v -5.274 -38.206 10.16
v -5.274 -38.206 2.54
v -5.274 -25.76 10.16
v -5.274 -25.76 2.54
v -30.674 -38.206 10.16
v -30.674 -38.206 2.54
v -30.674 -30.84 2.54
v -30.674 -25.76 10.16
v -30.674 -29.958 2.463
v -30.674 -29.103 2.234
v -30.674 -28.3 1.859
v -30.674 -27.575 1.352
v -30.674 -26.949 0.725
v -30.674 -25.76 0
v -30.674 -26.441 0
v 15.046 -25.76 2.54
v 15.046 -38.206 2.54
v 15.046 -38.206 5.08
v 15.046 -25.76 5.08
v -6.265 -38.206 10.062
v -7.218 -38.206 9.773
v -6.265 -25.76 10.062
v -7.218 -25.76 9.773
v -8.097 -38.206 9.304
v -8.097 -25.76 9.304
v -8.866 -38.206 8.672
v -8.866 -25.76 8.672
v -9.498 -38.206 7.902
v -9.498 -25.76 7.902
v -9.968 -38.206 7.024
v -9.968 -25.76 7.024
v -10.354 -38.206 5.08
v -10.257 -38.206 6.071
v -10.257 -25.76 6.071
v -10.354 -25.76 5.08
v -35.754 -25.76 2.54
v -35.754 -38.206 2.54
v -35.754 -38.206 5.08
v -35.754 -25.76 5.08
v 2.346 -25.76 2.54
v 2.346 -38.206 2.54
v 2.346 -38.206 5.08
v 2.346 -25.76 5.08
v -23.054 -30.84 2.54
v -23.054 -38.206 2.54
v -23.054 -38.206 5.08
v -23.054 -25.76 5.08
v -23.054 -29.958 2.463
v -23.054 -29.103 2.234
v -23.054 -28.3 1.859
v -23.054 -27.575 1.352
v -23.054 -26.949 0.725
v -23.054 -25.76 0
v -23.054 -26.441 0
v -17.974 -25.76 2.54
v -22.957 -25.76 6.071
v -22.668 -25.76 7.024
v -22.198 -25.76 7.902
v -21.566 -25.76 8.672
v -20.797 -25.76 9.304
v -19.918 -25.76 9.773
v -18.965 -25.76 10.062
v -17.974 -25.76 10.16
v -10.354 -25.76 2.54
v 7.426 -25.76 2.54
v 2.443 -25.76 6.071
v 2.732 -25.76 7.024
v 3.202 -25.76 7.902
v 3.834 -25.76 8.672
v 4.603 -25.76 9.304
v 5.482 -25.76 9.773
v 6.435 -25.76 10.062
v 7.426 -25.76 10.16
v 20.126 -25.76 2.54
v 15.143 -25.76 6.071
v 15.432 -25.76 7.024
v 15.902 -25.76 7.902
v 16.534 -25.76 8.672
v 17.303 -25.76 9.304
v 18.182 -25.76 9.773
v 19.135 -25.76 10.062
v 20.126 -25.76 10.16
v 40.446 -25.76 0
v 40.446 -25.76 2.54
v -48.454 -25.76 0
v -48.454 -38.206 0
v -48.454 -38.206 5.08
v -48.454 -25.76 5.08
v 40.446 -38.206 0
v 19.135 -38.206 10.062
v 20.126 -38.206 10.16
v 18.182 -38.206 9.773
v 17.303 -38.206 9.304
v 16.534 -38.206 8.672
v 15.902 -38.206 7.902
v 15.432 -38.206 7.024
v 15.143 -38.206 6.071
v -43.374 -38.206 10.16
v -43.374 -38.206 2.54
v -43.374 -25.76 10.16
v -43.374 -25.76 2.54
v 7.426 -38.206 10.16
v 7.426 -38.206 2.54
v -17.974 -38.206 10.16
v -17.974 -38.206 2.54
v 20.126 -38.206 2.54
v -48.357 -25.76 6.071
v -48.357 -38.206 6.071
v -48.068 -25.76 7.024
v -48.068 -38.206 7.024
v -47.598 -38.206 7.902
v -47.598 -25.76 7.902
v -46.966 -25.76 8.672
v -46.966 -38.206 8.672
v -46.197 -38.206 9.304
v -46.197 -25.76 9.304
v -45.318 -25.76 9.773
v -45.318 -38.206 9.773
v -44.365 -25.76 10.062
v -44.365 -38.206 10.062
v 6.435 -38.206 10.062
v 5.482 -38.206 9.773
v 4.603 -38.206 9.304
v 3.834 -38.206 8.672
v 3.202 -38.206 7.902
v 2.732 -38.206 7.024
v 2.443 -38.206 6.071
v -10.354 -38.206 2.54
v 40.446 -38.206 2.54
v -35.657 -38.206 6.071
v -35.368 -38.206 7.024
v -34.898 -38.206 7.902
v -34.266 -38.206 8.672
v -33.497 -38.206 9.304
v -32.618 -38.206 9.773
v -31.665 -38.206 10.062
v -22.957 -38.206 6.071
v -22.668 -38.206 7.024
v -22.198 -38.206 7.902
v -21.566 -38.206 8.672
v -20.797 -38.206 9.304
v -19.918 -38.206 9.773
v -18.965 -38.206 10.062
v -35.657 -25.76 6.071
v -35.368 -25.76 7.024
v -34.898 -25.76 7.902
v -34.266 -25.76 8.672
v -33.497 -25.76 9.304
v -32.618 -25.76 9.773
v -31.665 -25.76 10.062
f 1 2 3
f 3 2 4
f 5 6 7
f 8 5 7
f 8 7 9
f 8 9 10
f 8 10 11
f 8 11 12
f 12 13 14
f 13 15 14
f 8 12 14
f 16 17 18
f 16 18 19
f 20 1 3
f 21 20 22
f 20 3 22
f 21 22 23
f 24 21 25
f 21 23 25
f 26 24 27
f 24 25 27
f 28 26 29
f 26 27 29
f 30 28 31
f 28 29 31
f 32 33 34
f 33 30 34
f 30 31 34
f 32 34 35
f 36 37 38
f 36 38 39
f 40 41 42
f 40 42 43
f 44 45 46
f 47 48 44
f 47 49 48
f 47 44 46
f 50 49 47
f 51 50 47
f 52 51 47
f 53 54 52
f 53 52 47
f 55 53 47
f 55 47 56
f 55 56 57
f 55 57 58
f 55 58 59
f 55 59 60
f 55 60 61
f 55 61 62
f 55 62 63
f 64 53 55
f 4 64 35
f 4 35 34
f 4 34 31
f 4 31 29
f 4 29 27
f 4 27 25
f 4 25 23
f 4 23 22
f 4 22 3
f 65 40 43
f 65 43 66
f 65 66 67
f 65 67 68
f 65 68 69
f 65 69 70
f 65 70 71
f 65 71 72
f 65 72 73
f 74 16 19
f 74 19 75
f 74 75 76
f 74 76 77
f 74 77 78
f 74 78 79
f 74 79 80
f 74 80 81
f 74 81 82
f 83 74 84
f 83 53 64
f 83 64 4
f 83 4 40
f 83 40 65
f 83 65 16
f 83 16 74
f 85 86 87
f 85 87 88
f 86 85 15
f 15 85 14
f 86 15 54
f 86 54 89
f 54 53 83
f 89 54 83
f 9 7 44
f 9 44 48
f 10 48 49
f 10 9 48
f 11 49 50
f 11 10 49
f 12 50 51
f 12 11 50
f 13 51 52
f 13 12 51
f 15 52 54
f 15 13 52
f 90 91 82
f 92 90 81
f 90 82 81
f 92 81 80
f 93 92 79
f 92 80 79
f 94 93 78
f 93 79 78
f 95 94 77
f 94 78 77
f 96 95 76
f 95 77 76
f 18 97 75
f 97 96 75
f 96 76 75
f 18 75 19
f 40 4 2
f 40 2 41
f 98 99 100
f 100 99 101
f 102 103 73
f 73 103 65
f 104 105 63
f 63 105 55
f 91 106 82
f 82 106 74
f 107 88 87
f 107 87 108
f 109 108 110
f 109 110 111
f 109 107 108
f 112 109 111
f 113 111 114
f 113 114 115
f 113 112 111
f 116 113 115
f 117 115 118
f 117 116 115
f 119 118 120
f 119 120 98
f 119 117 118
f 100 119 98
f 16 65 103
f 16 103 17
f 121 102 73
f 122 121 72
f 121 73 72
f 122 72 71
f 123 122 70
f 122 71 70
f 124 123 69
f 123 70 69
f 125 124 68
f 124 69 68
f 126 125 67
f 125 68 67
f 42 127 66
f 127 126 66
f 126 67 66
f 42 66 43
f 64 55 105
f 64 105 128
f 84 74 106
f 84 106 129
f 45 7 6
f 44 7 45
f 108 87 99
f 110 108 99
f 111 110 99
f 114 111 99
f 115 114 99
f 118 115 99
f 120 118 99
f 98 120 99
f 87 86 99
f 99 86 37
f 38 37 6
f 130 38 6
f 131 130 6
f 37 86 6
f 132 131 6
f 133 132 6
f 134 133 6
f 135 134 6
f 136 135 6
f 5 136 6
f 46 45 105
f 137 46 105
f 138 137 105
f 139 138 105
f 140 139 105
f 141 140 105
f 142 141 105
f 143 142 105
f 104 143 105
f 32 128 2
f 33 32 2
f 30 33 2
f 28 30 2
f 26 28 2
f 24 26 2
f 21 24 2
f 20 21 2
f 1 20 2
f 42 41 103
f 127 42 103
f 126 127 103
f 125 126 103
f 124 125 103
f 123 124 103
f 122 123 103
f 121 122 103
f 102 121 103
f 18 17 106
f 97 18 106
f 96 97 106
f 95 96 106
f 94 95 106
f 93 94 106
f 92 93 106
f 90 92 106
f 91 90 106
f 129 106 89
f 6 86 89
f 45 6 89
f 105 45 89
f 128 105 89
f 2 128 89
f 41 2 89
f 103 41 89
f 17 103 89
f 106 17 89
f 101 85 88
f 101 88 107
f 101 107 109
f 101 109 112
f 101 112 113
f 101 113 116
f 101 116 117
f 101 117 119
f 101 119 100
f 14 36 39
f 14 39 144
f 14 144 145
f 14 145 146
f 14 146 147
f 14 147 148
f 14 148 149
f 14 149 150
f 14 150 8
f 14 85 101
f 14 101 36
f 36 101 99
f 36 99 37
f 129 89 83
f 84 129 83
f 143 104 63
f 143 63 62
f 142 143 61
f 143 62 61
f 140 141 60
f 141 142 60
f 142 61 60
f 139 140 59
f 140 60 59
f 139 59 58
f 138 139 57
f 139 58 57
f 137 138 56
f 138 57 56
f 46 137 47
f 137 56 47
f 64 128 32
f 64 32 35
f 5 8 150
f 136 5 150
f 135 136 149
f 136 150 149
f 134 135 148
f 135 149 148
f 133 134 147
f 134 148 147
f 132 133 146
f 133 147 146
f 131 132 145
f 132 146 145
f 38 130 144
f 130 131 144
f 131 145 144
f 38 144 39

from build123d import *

# Parameters (mm, degrees)
F0_W        = 88.9
F0_H        = 12.446
F1_DEPTH    = 2.54
F2_W        = 5.08
F2_H        = 12.446
F3_DEPTH    = 7.62
F4_T1_DEPTH = 37.846
F4_T3_DEPTH = 7.62


# Not quite as in the source:
# - a fillet or chamfer that OpenCascade refuses, or shapes differently, is made with other operations: its cross-section is extruded or revolved along the edge and cut away or added


with BuildPart() as f1:
    # F0 (on Top) → F1 (new body)
    with BuildSketch(Plane.XY):
        with Locations((-4.0042309799, -31.983400695)):
            Rectangle(F0_W, F0_H)
    extrude(amount=F1_DEPTH)

    # F2 (on face) → F3 (join)
    with BuildSketch(Plane.XY.offset(2.54)):
        with Locations((-45.9142309799, -31.983400695)):
            Rectangle(F2_W, F2_H)
        with Locations((-33.2142309799, -31.983400695)):
            Rectangle(F2_W, F2_H)
        with Locations((-20.5142309799, -31.983400695)):
            Rectangle(F2_W, F2_H)
        with Locations((-7.8142309799, -31.983400695)):
            Rectangle(F2_W, F2_H)
        with Locations((4.8857690201, -31.983400695)):
            Rectangle(F2_W, F2_H)
        with Locations((17.5857690201, -31.983400695)):
            Rectangle(F2_W, F2_H)
    extrude(amount=F3_DEPTH)

    # F4: fillet of radius 5.08 on 7 edges, made by hand

    # F4_s2 → F4_t1 (cut)
    with BuildSketch(Plane.XZ.offset(13.060400695)):
        with BuildLine():
            ThreePointArc((-48.4542309799, 5.08), (-46.9663334283, 8.6721024484), (-43.3742309799, 10.16))
            Line((-43.3742309799, 10.16), (-48.4542309799, 10.16))
            Line((-48.4542309799, 10.16), (-48.4542309799, 5.08))
        make_face()
        with BuildLine():
            ThreePointArc((-30.6742309799, 10.16), (-34.2663334283, 8.6721024484), (-35.7542309799, 5.08))
            Line((-35.7542309799, 5.08), (-35.7542309799, 10.16))
            Line((-35.7542309799, 10.16), (-30.6742309799, 10.16))
        make_face()
        with BuildLine():
            ThreePointArc((-17.9742309799, 10.16), (-21.5663334283, 8.6721024484), (-23.0542309799, 5.08))
            Line((-23.0542309799, 5.08), (-23.0542309799, 10.16))
            Line((-23.0542309799, 10.16), (-17.9742309799, 10.16))
        make_face()
        with BuildLine():
            ThreePointArc((-5.2742309799, 10.16), (-8.8663334283, 8.6721024484), (-10.3542309799, 5.08))
            Line((-10.3542309799, 5.08), (-10.3542309799, 10.16))
            Line((-10.3542309799, 10.16), (-5.2742309799, 10.16))
        make_face()
        with BuildLine():
            ThreePointArc((7.4257690201, 10.16), (3.8336665717, 8.6721024484), (2.3457690201, 5.08))
            Line((2.3457690201, 5.08), (2.3457690201, 10.16))
            Line((2.3457690201, 10.16), (7.4257690201, 10.16))
        make_face()
        with BuildLine():
            ThreePointArc((20.1257690201, 10.16), (16.5336665717, 8.6721024484), (15.0457690201, 5.08))
            Line((15.0457690201, 5.08), (15.0457690201, 10.16))
            Line((15.0457690201, 10.16), (20.1257690201, 10.16))
        make_face()
    extrude(amount=F4_T1_DEPTH, mode=Mode.SUBTRACT)

    # F4_s4 → F4_t3 (cut)
    with BuildSketch(Plane.YZ.offset(-30.6742309799)):
        with BuildLine():
            ThreePointArc((-30.840400695, 2.54), (-27.2482982466, 1.0521024484), (-25.760400695, -2.54))
            Line((-25.760400695, -2.54), (-25.760400695, 2.54))
            Line((-25.760400695, 2.54), (-30.840400695, 2.54))
        make_face()
    extrude(amount=F4_T3_DEPTH, mode=Mode.SUBTRACT)


solid = f1.part
